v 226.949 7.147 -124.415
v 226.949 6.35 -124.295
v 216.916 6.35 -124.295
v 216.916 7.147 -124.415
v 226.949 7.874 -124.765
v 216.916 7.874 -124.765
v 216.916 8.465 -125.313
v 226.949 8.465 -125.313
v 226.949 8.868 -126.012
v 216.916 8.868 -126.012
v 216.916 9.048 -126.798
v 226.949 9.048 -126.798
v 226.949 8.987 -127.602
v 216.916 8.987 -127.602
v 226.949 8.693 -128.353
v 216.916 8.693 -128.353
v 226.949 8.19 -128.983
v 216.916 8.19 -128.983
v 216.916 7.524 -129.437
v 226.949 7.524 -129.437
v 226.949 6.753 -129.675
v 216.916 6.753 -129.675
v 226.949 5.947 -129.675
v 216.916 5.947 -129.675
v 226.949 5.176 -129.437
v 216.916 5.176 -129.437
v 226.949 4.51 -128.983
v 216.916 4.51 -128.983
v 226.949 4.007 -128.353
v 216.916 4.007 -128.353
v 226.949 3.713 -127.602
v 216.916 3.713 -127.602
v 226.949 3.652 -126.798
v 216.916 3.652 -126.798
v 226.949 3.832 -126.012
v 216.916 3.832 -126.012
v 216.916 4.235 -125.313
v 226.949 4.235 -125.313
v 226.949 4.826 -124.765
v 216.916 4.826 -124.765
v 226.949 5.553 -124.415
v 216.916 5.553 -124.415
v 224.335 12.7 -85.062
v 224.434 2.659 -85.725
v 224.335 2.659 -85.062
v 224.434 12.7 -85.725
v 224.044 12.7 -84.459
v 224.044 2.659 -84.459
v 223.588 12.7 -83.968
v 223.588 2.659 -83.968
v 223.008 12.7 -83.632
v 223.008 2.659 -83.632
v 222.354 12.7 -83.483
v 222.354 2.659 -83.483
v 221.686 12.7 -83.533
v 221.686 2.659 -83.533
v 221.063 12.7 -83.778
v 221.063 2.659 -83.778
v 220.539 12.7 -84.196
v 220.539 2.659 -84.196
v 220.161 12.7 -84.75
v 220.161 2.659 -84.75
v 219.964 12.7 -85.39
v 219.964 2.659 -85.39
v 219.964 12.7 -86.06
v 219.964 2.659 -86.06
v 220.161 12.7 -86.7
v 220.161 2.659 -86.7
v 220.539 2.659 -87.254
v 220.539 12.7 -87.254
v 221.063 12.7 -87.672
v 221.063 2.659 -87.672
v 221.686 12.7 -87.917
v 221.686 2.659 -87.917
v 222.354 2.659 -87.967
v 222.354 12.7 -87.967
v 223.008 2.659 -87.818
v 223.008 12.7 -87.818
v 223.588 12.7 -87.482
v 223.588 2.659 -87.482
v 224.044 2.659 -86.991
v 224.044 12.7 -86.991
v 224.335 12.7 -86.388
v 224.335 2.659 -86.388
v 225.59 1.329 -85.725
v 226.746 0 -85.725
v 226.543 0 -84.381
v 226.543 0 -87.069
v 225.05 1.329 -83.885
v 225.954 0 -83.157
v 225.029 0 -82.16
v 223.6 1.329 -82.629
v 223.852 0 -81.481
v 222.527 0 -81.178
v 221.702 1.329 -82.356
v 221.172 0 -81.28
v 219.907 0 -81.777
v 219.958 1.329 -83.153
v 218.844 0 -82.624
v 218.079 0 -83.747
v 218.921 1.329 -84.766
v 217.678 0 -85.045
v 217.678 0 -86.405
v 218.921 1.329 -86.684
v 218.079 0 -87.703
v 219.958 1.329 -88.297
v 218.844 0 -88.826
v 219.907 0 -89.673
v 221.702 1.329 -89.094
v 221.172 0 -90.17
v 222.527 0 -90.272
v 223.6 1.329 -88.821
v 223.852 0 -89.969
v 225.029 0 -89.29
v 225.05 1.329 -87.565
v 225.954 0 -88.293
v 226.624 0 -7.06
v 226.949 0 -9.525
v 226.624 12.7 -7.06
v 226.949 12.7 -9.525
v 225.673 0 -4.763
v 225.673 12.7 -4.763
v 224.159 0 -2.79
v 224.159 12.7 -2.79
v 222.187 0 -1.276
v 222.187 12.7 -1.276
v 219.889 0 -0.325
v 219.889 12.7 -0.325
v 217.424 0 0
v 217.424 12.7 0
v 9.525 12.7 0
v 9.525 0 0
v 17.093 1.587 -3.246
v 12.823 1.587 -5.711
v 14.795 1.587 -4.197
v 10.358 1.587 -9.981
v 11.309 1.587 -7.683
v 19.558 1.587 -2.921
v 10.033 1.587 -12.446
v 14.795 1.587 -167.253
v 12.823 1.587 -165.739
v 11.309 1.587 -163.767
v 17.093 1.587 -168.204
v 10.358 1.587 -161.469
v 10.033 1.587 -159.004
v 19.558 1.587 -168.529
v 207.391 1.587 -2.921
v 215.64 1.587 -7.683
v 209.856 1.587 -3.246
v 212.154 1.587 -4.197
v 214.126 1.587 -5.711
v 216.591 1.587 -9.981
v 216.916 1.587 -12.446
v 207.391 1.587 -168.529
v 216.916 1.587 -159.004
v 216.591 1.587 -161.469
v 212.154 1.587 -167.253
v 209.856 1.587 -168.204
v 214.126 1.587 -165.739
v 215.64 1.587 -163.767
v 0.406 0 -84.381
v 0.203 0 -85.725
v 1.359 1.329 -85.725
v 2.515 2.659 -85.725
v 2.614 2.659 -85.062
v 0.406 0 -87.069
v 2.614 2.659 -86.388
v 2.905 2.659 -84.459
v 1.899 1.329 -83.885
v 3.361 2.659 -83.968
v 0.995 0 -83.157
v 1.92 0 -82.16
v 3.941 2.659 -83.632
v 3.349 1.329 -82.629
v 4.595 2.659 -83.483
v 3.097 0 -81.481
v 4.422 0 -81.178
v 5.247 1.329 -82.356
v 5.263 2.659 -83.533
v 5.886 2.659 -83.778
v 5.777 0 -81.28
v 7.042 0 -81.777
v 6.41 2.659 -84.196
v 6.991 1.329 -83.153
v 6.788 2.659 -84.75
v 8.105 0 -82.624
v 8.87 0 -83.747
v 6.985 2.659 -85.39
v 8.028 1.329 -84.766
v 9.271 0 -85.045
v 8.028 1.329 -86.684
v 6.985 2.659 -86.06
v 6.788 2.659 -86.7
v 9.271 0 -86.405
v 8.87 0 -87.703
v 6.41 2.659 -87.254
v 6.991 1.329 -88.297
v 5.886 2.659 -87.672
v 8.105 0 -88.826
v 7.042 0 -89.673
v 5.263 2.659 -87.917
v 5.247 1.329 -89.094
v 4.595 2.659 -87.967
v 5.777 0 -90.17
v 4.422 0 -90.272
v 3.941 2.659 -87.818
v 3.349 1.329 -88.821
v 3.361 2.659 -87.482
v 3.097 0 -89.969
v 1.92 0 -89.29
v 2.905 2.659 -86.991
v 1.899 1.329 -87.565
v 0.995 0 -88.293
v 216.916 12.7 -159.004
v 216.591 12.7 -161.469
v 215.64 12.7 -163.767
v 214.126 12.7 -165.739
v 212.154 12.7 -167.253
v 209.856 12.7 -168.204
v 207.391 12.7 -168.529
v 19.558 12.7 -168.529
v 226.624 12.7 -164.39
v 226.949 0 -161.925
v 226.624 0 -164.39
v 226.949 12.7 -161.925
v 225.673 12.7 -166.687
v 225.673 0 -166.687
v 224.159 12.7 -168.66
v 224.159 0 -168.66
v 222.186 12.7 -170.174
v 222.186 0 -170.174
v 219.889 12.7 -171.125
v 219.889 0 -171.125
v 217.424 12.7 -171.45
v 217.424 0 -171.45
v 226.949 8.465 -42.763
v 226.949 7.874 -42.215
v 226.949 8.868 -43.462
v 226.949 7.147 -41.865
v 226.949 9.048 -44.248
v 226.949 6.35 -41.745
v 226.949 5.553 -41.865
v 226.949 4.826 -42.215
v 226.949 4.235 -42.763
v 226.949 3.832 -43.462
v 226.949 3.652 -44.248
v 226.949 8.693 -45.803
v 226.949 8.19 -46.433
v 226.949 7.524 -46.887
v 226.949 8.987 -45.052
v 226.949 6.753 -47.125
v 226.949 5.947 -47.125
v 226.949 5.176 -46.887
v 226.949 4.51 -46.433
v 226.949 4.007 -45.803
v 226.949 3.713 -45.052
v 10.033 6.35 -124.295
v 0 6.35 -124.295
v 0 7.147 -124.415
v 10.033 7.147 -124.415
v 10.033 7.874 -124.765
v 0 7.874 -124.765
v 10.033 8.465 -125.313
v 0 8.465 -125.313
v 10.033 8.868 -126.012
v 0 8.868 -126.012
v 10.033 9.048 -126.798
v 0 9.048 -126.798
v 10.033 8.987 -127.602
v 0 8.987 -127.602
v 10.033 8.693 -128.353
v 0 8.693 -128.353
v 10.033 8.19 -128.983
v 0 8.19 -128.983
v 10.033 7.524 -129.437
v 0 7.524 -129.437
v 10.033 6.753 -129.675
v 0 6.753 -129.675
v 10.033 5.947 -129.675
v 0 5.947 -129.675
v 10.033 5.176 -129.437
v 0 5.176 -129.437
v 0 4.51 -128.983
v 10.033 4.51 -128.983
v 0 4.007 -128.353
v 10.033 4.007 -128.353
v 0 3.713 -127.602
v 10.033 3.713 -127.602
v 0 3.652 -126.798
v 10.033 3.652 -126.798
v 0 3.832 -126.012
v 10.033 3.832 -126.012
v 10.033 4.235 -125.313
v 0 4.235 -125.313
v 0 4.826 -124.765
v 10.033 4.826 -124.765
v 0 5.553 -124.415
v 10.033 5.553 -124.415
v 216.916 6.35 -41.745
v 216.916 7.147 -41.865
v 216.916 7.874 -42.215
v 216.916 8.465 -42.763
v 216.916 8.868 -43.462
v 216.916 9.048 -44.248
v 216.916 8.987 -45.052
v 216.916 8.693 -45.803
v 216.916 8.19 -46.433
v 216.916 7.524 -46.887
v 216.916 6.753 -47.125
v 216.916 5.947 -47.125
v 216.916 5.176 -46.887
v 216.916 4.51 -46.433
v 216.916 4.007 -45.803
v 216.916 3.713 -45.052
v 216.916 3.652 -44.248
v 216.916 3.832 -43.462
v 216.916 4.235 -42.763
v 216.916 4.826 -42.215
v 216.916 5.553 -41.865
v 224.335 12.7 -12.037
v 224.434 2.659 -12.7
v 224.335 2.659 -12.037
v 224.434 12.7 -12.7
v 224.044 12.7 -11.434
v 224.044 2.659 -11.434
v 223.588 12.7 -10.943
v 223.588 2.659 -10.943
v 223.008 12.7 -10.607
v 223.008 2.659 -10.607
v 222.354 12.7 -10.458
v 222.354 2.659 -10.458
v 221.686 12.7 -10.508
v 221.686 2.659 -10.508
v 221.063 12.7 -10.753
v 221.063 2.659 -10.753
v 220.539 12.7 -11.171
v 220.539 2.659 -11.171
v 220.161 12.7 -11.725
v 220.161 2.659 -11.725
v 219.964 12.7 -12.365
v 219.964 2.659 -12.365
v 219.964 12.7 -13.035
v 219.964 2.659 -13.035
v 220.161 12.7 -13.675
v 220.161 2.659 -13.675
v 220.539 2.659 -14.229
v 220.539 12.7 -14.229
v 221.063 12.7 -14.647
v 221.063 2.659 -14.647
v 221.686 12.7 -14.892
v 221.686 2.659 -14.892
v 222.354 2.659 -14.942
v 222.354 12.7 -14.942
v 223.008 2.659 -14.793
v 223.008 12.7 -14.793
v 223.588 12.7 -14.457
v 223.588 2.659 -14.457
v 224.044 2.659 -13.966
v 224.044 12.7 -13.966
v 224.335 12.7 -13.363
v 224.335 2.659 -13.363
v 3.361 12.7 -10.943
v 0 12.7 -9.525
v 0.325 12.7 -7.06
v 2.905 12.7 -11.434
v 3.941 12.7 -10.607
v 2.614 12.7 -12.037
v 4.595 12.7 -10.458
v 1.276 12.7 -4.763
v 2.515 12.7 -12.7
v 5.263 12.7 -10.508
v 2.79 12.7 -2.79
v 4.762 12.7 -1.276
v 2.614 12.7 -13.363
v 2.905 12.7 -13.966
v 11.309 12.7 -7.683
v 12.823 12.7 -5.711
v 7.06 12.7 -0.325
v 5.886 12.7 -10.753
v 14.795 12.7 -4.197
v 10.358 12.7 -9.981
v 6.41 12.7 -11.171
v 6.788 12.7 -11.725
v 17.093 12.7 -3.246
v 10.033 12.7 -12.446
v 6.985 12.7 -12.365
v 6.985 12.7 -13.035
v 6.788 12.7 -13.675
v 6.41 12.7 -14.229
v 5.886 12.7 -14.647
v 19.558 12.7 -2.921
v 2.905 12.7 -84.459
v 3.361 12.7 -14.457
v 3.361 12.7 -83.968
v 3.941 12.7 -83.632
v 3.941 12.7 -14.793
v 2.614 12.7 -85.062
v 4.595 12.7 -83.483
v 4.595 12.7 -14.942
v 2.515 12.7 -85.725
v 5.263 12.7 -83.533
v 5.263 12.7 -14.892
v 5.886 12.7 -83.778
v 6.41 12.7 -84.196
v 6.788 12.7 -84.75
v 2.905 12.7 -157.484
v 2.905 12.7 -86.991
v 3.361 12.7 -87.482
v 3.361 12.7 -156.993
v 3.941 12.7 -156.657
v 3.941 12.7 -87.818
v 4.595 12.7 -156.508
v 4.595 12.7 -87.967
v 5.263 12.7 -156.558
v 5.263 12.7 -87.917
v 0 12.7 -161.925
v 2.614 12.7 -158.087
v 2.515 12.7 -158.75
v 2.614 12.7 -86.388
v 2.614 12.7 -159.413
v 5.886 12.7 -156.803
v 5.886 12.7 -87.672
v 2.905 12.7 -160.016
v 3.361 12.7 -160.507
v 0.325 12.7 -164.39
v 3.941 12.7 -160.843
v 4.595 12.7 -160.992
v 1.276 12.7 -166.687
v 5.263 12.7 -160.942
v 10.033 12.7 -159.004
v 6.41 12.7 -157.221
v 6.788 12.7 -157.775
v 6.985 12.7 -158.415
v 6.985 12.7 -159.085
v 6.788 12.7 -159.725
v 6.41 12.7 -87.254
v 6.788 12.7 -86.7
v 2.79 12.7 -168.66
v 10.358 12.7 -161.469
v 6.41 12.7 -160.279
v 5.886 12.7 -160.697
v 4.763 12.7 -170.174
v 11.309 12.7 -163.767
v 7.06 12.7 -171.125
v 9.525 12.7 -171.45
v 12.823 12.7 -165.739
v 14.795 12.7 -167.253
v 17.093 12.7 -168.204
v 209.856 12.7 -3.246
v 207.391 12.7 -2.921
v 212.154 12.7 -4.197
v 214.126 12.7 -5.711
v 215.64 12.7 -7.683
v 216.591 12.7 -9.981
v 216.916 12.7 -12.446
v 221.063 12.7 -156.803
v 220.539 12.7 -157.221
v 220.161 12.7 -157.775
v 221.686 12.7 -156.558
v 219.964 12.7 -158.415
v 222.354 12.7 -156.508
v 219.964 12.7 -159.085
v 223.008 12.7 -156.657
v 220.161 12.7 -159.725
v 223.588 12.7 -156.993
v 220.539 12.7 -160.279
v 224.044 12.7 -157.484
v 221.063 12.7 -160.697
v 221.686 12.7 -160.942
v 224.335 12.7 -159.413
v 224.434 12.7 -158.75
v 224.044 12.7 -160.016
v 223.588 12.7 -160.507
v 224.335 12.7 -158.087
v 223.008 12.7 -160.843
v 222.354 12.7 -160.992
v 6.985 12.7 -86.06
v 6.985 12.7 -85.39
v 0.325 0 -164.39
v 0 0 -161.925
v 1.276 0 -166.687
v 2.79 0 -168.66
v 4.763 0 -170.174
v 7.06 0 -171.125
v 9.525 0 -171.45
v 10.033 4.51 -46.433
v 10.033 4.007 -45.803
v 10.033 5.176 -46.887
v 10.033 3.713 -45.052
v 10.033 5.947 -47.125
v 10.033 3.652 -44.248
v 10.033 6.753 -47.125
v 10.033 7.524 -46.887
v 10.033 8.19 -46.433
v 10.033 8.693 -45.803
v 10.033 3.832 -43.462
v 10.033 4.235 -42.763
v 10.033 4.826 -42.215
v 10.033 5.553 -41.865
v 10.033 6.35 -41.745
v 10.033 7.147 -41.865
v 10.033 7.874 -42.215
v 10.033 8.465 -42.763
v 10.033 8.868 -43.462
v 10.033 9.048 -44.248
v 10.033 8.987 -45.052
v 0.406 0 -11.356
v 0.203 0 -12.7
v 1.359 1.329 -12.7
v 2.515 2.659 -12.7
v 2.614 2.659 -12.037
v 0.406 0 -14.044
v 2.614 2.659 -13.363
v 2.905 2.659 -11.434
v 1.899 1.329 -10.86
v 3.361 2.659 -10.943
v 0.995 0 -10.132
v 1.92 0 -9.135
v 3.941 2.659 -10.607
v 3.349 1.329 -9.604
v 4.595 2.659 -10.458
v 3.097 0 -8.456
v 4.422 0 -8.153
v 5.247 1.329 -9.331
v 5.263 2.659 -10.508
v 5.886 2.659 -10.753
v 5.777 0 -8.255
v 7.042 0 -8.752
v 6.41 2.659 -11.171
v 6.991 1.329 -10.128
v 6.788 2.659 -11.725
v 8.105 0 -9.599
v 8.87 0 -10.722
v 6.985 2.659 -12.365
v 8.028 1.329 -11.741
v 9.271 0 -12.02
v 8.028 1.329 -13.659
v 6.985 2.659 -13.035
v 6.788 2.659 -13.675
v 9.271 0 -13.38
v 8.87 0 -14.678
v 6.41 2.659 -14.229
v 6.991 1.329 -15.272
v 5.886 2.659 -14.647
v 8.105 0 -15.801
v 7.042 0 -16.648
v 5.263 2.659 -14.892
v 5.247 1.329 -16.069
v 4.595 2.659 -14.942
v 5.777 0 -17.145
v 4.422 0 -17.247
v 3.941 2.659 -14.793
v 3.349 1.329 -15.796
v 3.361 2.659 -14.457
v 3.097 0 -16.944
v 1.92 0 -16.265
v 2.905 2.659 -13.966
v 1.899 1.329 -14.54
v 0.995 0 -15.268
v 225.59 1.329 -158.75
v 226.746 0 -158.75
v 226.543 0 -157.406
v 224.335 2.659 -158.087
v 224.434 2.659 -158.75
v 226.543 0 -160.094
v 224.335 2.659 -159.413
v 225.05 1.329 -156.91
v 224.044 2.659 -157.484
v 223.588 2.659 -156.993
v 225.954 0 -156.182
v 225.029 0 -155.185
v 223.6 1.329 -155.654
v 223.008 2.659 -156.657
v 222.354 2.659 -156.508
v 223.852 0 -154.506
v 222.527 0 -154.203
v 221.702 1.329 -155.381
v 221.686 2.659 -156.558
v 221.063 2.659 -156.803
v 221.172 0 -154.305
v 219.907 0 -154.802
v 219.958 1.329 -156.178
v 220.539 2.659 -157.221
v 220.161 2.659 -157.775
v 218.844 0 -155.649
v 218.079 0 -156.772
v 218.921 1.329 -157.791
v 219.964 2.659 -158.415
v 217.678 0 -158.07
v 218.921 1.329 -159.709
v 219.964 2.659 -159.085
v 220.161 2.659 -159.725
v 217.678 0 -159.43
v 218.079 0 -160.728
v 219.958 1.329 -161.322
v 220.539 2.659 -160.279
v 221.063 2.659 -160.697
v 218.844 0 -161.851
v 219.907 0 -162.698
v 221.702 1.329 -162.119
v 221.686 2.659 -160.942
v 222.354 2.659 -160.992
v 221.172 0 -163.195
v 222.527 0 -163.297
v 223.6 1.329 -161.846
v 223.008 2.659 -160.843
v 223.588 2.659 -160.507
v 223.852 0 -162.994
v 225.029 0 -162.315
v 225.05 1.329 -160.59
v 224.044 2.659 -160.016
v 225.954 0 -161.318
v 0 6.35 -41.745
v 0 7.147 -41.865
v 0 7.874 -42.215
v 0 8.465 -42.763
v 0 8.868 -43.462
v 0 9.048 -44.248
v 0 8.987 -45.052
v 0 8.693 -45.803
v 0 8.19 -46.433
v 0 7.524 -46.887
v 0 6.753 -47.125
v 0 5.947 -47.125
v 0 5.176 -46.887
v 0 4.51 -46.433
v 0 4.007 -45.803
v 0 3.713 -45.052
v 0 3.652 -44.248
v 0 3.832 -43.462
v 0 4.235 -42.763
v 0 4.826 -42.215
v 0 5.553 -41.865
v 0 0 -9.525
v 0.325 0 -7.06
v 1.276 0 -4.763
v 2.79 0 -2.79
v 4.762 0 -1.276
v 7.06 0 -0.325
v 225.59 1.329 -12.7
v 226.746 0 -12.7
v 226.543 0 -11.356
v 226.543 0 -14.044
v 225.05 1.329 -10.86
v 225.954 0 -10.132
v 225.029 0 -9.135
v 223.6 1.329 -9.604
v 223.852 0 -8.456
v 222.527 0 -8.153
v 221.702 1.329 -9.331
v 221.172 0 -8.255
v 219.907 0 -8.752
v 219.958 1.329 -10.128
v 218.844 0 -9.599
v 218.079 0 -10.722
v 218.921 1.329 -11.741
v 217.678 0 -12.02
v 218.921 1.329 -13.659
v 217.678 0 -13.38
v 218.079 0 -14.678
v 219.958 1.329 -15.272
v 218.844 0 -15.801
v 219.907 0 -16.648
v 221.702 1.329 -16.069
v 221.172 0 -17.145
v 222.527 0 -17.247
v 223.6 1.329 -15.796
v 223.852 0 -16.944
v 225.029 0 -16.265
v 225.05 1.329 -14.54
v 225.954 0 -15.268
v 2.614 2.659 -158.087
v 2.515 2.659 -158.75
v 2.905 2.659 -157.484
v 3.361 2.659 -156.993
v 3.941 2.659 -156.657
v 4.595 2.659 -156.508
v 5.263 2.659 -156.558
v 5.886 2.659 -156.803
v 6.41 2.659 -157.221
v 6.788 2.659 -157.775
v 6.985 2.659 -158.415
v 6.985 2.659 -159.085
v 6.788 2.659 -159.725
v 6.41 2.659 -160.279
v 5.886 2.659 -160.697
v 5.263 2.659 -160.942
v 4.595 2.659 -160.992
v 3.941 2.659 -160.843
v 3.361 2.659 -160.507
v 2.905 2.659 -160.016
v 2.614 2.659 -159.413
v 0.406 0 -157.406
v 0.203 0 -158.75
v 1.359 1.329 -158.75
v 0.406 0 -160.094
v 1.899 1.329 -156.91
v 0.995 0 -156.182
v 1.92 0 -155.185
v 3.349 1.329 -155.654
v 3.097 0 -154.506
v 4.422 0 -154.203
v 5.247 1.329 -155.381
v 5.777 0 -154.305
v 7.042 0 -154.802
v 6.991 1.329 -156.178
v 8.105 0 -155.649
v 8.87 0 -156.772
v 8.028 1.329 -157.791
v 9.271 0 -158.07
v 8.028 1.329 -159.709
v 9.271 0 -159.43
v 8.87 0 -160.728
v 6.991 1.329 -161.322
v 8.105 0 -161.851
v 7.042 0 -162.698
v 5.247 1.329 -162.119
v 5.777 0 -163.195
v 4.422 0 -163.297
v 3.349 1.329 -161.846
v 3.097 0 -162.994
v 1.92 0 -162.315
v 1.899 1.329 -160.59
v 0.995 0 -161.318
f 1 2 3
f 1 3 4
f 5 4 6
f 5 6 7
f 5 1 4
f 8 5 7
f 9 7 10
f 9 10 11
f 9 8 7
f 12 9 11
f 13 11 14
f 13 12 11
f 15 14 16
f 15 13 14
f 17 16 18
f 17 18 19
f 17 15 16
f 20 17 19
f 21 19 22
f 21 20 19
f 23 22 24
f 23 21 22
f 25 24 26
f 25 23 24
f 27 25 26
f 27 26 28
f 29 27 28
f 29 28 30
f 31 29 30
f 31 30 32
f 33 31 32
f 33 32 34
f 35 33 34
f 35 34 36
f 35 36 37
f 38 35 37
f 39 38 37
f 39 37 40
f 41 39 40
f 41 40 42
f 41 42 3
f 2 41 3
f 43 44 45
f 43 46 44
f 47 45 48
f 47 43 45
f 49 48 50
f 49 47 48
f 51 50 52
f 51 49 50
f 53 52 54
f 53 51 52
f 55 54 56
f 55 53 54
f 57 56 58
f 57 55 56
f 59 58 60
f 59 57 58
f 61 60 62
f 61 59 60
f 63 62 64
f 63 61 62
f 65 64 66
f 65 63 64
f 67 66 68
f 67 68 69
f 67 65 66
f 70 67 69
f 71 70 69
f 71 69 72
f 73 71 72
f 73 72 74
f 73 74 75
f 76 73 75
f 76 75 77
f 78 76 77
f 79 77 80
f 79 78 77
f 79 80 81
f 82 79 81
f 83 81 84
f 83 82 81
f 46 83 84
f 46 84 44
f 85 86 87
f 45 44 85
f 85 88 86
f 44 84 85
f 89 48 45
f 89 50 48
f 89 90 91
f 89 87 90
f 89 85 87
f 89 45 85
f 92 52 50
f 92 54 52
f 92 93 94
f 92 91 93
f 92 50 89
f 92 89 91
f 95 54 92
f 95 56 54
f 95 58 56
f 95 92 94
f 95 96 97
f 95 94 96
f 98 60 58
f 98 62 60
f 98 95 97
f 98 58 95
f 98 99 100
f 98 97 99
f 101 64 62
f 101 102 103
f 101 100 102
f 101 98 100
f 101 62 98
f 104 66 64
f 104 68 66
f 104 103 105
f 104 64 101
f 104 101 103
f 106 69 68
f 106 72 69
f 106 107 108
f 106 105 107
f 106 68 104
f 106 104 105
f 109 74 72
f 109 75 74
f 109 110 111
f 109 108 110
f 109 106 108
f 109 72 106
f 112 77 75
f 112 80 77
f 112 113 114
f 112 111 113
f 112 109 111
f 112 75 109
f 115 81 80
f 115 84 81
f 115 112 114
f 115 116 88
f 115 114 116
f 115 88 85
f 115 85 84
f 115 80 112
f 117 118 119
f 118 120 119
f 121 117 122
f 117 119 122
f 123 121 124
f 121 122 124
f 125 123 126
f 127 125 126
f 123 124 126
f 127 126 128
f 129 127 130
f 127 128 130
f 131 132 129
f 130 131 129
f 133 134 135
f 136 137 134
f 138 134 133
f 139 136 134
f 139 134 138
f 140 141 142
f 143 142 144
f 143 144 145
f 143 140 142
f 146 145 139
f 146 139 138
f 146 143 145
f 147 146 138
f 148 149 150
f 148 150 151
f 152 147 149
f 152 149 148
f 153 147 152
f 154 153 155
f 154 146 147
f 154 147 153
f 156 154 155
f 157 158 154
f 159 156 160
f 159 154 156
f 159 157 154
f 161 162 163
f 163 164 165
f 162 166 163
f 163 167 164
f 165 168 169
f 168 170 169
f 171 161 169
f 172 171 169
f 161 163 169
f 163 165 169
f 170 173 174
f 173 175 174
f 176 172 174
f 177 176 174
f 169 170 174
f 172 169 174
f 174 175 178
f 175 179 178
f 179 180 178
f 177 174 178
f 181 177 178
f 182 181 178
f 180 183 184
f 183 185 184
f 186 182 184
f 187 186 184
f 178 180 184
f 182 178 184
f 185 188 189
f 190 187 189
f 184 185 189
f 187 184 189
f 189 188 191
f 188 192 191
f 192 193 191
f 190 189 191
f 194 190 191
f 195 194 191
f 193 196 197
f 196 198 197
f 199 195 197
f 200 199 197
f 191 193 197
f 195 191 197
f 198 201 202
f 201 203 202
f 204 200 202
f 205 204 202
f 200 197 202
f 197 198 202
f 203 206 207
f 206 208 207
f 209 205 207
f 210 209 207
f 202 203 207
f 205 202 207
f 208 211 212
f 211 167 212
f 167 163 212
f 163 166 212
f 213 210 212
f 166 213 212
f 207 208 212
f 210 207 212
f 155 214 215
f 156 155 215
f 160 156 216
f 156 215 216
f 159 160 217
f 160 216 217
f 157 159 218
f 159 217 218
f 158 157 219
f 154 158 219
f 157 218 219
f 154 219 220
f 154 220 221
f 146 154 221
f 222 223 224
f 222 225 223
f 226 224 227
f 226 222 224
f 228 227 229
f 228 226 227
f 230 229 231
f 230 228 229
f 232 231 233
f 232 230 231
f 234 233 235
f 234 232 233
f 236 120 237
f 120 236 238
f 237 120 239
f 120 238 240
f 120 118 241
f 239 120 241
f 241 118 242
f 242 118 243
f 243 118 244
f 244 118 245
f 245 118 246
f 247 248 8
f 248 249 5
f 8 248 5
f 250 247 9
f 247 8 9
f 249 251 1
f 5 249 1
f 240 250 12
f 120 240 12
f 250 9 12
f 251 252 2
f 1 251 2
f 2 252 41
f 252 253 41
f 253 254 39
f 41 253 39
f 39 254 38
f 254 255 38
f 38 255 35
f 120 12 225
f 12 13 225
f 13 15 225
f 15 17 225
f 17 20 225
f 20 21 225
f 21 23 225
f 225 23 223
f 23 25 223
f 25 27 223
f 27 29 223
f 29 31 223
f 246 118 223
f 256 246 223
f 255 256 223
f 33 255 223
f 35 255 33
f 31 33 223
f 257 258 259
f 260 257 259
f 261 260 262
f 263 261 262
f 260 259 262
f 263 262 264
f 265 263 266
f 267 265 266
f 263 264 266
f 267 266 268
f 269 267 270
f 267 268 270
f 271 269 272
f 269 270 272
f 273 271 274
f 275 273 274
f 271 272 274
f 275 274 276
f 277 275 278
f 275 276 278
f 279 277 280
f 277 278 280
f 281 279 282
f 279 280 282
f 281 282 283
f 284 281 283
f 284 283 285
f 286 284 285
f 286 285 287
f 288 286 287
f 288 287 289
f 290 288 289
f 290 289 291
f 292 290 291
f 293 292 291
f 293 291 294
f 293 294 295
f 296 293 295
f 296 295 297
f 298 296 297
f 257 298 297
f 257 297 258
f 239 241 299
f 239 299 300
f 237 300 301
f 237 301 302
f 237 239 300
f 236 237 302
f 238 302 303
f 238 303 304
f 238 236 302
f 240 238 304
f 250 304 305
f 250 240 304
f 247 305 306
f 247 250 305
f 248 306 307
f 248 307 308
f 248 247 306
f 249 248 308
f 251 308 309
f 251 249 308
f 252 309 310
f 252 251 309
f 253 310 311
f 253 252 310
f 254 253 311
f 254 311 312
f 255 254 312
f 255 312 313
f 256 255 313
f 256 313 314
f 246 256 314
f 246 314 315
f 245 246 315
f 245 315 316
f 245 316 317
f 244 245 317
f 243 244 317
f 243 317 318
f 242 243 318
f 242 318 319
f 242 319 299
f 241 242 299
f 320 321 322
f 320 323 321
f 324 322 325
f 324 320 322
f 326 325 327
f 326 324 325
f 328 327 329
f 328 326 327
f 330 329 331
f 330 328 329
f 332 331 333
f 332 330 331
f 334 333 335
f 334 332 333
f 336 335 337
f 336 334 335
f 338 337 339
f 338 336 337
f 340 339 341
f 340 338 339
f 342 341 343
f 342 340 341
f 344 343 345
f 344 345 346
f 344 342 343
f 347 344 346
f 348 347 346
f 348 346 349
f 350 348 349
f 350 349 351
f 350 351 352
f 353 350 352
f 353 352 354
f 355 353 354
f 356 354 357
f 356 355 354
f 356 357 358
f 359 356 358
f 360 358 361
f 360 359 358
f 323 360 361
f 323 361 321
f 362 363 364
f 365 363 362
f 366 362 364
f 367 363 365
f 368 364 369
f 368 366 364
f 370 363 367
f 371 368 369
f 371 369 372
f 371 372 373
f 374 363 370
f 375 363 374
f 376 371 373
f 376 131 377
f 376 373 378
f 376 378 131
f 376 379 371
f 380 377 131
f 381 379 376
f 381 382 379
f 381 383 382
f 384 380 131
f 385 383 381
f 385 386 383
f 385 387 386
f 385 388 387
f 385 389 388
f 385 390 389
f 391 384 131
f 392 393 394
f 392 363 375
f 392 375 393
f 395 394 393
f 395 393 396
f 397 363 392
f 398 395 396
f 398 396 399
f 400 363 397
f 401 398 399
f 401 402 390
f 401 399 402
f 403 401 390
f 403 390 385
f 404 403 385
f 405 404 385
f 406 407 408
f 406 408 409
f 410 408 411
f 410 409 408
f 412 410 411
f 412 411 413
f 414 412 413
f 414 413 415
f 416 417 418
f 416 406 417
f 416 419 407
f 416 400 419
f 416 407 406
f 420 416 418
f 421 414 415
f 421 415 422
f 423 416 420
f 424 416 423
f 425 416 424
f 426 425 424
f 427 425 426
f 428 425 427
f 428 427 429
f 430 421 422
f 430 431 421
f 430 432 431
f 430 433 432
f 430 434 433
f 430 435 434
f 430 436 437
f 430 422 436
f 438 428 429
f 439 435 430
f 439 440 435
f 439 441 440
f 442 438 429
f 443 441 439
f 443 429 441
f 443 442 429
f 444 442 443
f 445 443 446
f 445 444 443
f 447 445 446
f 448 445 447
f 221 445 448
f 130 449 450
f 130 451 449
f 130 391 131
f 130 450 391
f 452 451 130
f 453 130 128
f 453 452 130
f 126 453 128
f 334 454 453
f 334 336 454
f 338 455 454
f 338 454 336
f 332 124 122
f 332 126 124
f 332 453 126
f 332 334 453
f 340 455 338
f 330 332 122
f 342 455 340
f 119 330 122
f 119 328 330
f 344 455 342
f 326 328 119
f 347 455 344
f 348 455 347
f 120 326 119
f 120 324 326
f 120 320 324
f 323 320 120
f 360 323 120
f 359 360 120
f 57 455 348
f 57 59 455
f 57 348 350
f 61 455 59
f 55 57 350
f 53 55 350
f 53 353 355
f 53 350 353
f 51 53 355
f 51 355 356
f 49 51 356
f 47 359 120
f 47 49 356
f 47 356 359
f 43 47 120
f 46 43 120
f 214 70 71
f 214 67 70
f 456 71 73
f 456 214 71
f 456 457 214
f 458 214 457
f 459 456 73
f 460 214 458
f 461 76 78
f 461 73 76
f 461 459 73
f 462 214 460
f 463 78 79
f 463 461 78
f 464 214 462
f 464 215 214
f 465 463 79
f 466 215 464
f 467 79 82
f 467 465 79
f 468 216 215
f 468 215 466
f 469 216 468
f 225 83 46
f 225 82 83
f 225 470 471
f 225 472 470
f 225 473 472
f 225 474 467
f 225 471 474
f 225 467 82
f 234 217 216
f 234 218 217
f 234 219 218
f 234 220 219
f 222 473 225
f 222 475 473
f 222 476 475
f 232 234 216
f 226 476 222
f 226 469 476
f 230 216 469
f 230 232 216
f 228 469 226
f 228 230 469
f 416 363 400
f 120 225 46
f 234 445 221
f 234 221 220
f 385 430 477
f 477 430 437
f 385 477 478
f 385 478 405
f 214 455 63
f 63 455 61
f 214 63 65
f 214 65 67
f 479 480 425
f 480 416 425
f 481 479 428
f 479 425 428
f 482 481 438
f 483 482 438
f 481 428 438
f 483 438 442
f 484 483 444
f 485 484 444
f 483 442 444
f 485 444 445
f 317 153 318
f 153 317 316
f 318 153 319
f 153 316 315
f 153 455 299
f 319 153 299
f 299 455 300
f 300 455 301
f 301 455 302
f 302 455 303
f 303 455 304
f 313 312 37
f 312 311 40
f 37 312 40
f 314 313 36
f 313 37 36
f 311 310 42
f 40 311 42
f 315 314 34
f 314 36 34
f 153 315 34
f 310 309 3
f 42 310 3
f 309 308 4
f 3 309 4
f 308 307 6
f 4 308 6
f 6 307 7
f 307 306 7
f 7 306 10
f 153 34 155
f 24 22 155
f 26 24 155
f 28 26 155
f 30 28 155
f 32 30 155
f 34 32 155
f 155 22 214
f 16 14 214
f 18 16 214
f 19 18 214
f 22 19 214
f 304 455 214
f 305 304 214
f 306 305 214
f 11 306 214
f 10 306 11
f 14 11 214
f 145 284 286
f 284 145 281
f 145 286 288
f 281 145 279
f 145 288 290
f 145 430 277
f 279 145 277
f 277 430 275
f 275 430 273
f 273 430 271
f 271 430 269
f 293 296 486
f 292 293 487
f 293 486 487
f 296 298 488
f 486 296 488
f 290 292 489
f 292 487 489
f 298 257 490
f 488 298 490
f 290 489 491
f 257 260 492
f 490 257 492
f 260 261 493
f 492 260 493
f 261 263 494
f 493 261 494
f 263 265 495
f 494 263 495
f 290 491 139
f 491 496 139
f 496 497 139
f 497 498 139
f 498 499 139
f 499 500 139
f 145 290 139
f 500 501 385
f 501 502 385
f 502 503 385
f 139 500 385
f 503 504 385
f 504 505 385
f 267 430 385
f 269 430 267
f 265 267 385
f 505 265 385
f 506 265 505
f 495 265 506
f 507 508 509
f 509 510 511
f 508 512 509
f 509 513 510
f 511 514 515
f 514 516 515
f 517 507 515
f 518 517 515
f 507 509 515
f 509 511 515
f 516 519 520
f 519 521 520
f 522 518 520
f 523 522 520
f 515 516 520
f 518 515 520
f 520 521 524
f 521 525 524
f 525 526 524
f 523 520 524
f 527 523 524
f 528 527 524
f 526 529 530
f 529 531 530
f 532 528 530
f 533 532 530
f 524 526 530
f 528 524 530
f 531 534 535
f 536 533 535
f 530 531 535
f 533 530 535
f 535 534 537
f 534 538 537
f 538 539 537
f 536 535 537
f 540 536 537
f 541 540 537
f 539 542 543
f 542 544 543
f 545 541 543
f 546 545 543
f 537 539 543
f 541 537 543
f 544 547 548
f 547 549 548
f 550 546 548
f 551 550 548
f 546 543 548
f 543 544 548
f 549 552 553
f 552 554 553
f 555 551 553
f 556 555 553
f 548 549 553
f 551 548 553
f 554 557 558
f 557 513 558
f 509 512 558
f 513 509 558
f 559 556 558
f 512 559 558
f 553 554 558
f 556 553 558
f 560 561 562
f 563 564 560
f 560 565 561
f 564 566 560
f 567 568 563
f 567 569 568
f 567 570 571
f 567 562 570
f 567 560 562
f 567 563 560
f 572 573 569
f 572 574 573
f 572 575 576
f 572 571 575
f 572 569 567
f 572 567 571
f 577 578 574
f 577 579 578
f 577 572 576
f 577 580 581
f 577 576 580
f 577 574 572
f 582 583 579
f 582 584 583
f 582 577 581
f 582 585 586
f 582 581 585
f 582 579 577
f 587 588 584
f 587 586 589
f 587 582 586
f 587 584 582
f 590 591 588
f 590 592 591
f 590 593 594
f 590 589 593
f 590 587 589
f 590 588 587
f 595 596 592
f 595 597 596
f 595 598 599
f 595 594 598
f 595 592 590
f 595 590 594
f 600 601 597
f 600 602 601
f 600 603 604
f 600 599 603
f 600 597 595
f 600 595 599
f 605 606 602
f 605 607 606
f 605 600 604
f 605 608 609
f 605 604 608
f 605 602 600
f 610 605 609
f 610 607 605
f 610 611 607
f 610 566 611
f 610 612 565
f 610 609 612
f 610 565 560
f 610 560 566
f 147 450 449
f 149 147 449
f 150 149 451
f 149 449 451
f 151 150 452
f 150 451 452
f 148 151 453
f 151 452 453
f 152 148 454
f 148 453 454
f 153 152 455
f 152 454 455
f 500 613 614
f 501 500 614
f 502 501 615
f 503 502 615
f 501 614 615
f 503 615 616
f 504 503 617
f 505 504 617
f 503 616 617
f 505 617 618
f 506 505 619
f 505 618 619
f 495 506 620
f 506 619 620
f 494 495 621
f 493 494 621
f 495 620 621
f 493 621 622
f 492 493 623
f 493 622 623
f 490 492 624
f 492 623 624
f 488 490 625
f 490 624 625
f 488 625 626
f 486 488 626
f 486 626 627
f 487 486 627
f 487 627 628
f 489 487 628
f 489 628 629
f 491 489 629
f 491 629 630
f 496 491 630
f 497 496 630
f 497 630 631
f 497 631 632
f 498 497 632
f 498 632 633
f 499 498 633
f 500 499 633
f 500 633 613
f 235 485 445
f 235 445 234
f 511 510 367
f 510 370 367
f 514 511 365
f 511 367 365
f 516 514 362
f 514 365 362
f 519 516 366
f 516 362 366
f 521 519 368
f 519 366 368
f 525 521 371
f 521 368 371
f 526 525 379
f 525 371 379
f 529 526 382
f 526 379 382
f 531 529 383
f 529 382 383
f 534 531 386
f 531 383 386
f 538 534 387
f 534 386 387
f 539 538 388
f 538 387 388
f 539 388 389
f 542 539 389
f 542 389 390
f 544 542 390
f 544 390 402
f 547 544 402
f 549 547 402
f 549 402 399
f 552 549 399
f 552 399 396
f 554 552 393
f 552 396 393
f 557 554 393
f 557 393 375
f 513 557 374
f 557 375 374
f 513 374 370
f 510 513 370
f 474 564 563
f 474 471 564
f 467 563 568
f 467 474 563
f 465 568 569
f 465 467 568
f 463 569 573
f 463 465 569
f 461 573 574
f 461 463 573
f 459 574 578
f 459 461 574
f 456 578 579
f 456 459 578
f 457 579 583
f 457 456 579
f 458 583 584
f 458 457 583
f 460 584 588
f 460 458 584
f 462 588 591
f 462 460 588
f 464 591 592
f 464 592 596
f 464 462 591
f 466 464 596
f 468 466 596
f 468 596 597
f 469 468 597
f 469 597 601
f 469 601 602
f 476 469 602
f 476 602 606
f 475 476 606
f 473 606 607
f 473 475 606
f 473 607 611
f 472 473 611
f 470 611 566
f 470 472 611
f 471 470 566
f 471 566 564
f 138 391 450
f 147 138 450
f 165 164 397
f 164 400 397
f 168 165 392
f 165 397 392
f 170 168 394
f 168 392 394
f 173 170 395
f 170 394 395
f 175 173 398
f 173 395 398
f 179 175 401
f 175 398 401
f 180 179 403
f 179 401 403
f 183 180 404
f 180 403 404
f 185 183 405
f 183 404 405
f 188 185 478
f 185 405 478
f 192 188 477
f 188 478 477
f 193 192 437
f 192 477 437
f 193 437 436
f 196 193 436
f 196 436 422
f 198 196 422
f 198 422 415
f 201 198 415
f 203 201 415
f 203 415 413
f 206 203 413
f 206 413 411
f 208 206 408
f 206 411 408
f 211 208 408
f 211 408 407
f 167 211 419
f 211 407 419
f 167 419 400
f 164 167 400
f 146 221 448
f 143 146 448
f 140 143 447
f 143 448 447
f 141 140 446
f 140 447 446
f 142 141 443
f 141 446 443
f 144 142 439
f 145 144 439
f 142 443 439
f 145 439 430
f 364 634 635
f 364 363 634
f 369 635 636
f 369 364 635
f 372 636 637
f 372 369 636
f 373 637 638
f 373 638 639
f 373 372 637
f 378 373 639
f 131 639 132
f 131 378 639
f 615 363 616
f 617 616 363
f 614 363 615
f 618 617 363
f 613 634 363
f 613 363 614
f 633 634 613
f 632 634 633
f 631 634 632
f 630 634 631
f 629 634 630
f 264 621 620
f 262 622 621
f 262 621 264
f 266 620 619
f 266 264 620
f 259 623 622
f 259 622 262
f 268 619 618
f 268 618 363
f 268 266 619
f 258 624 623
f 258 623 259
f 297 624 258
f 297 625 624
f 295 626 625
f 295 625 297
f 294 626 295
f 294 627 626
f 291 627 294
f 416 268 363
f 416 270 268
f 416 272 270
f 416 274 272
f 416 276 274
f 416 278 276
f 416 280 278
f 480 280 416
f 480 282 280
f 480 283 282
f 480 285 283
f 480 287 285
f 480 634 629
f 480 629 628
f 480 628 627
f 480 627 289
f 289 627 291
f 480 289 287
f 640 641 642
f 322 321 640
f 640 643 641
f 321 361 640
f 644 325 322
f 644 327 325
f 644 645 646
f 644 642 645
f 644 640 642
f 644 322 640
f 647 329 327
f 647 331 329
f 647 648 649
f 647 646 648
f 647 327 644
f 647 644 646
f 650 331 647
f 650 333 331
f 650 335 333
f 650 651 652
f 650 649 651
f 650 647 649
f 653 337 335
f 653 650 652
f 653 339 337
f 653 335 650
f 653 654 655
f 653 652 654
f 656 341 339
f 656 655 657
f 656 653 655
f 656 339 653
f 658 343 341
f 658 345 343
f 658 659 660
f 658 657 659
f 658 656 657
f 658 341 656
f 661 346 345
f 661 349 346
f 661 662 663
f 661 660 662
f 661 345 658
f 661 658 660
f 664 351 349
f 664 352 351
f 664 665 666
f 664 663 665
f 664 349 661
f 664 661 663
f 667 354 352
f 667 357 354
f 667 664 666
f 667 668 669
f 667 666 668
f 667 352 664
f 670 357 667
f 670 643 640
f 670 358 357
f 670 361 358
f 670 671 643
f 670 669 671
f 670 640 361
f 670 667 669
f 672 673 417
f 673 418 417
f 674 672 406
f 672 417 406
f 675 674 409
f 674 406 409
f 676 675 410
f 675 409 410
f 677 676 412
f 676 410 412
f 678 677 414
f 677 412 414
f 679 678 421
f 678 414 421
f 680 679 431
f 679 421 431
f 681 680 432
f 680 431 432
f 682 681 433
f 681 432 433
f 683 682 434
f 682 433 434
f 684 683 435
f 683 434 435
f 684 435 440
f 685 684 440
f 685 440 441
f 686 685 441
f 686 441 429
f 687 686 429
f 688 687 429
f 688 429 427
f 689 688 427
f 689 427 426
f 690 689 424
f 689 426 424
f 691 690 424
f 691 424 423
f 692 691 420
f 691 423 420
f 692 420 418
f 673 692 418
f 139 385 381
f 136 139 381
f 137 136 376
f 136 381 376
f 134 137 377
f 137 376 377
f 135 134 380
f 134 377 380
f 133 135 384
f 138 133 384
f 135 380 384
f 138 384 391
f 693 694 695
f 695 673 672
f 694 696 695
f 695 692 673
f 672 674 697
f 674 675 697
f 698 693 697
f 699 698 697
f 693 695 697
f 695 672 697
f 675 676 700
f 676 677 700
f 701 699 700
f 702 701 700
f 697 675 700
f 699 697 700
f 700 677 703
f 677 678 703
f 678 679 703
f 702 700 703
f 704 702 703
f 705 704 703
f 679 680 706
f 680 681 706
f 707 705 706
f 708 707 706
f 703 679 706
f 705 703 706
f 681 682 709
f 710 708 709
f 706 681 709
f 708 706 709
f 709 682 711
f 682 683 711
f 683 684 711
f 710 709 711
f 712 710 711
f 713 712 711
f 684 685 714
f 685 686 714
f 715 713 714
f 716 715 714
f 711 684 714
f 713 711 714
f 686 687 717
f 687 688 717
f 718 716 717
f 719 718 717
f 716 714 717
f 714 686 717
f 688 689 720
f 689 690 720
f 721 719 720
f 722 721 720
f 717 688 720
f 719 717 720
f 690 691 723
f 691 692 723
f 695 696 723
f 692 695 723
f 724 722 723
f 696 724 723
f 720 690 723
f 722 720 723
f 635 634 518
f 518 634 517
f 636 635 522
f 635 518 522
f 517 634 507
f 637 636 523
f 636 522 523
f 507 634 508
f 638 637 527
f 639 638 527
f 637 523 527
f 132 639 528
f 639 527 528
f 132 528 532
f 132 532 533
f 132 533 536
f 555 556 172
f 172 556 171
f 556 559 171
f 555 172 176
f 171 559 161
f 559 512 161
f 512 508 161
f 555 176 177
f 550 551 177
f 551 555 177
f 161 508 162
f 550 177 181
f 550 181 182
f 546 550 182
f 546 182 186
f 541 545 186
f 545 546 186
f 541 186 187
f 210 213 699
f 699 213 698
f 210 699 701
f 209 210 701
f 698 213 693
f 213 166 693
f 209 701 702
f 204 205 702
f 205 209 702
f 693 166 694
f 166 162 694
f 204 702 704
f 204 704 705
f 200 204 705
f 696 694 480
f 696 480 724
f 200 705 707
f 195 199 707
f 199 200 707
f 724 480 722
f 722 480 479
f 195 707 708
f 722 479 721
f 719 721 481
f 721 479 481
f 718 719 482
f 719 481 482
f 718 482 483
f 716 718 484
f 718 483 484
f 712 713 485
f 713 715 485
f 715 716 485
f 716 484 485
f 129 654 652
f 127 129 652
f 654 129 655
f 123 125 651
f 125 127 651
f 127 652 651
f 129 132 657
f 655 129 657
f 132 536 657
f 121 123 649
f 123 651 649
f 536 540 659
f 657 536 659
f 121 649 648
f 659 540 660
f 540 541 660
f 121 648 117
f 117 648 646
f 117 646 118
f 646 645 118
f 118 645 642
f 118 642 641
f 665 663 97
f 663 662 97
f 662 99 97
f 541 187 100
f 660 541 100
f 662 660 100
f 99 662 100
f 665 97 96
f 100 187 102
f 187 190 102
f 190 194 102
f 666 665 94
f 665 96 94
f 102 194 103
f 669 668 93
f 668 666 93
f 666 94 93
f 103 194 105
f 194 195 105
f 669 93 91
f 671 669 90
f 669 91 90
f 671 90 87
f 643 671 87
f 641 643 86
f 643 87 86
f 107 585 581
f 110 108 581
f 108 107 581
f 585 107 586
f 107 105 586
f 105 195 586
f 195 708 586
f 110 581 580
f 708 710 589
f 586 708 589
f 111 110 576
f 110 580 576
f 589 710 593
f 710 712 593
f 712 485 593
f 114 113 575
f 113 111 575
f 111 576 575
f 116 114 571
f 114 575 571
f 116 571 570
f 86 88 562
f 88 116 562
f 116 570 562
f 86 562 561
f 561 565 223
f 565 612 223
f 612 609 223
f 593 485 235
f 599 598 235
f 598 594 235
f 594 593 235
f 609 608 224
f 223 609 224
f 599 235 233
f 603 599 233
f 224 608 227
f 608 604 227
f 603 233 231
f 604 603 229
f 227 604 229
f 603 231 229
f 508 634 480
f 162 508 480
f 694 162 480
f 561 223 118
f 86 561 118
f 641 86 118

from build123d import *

# Parameters (mm, degrees)
SKETCH1_W                                         = 226.949
SKETCH1_H                                         = 171.45
BOSS_EXTRUDE1_DEPTH                               = 12.7
CUT_EXTRUDE1_DEPTH                                = 11.1125
F_1_4_28_TAPPED_HOLE1_REACH                       = 286.714
F_1_4_28_TAPPED_HOLE1_BORE_R                      = 2.7051
CSK_FOR_8_FLAT_HEAD_SOCKET_CAP_SCREW1_D           = 4.4958
CSK_FOR_8_FLAT_HEAD_SOCKET_CAP_SCREW1_CSINK_D     = 9.1186
CSK_FOR_8_FLAT_HEAD_SOCKET_CAP_SCREW1_CSINK_ANGLE = 82
FILLET1_R                                         = 9.525


with BuildPart() as part:
    # Sketch1 → Boss-Extrude1 (new body)
    with BuildSketch(Plane(origin=(0, 0, 0), x_dir=(1, 0, 0), z_dir=(0, 1, 0))):
        with Locations((113.4745, 85.725)):
            Rectangle(SKETCH1_W, SKETCH1_H)
    extrude(amount=BOSS_EXTRUDE1_DEPTH)

    # Sketch2 → Cut-Extrude1 (cut)
    with BuildSketch(Plane(origin=(0, 12.7, 0), x_dir=(1, 0, 0), z_dir=(0, 1, 0))):
        with BuildLine():
            Line((19.558, 2.921), (207.391, 2.921))
            ThreePointArc((207.391, 2.921), (214.126192091, 5.710807909), (216.916, 12.446))
            Line((216.916, 12.446), (216.916, 159.004))
            ThreePointArc((216.916, 159.004), (214.126192091, 165.739192091), (207.391, 168.529))
            Line((207.391, 168.529), (19.558, 168.529))
            ThreePointArc((19.558, 168.529), (12.822807909, 165.739192091), (10.033, 159.004))
            Line((10.033, 159.004), (10.033, 12.446))
            ThreePointArc((10.033, 12.446), (12.822807909, 5.710807909), (19.558, 2.921))
        make_face()
    extrude(amount=-CUT_EXTRUDE1_DEPTH, mode=Mode.SUBTRACT)

    # 1/4-28 Tapped Hole1 bore → 1/4-28 Tapped Hole1 (cut, up to next)
    with BuildSketch(Plane.ZY, mode=Mode.PRIVATE) as f_1_4_28_tapped_hole1_sk1:
        with Locations((-127, 6.35)):
            Circle(F_1_4_28_TAPPED_HOLE1_BORE_R)
    f_1_4_28_tapped_hole1_tool1 = extrude(f_1_4_28_tapped_hole1_sk1.sketch, amount=-F_1_4_28_TAPPED_HOLE1_REACH, mode=Mode.PRIVATE) & part.part
    # 1/4-28 Tapped Hole1 bore → 1/4-28 Tapped Hole1 (cut, up to next)
    with BuildSketch(Plane.ZY, mode=Mode.PRIVATE) as f_1_4_28_tapped_hole1_sk2:
        with Locations((-44.45, 6.35)):
            Circle(F_1_4_28_TAPPED_HOLE1_BORE_R)
    f_1_4_28_tapped_hole1_tool2 = extrude(f_1_4_28_tapped_hole1_sk2.sketch, amount=-F_1_4_28_TAPPED_HOLE1_REACH, mode=Mode.PRIVATE) & part.part
    f_1_4_28_tapped_hole1_1 = f_1_4_28_tapped_hole1_tool1.solids().sort_by_distance((0, 6.35, -127))[0]
    add(f_1_4_28_tapped_hole1_1, mode=Mode.SUBTRACT)
    f_1_4_28_tapped_hole1_2 = f_1_4_28_tapped_hole1_tool2.solids().sort_by_distance((0, 6.35, -44.45))[0]
    add(f_1_4_28_tapped_hole1_2, mode=Mode.SUBTRACT)
    f_1_4_28_tapped_hole1 = f_1_4_28_tapped_hole1_1 + f_1_4_28_tapped_hole1_2  # 1/4-28 Tapped Hole1 as one shape, for the pattern or mirror that repeats it

    # CSK for #8 Flat Head Socket Cap Screw1 (through all)
    with Locations(Plane.XZ):
        with Locations((4.7625, -12.7), (4.7625, -85.725), (4.7625, -158.75)):
            csk_for_8_flat_head_socket_cap_screw1 = CounterSinkHole(CSK_FOR_8_FLAT_HEAD_SOCKET_CAP_SCREW1_D / 2, CSK_FOR_8_FLAT_HEAD_SOCKET_CAP_SCREW1_CSINK_D / 2, counter_sink_angle=CSK_FOR_8_FLAT_HEAD_SOCKET_CAP_SCREW1_CSINK_ANGLE)

    # Mirror1: 1/4-28 Tapped Hole1, CSK for #8 Flat Head Socket Cap Screw1 across plane
    add(f_1_4_28_tapped_hole1.mirror(Plane(origin=(113.4745, 0, 0), x_dir=(0, 0, 1), z_dir=(1, 0, 0))), mode=Mode.SUBTRACT)
    add(csk_for_8_flat_head_socket_cap_screw1.mirror(Plane(origin=(113.4745, 0, 0), x_dir=(0, 0, 1), z_dir=(1, 0, 0))), mode=Mode.SUBTRACT)

    # Fillet1
    fillet1_edges = [part.edges().sort_by_distance(p)[0] for p in [
        (0, 6.35, -171.45),
        (226.949, 6.35, -171.45),
        (226.949, 6.35, 0),
        (0, 6.35, 0),
    ]]
    fillet(fillet1_edges, radius=FILLET1_R)


solid = part.part
